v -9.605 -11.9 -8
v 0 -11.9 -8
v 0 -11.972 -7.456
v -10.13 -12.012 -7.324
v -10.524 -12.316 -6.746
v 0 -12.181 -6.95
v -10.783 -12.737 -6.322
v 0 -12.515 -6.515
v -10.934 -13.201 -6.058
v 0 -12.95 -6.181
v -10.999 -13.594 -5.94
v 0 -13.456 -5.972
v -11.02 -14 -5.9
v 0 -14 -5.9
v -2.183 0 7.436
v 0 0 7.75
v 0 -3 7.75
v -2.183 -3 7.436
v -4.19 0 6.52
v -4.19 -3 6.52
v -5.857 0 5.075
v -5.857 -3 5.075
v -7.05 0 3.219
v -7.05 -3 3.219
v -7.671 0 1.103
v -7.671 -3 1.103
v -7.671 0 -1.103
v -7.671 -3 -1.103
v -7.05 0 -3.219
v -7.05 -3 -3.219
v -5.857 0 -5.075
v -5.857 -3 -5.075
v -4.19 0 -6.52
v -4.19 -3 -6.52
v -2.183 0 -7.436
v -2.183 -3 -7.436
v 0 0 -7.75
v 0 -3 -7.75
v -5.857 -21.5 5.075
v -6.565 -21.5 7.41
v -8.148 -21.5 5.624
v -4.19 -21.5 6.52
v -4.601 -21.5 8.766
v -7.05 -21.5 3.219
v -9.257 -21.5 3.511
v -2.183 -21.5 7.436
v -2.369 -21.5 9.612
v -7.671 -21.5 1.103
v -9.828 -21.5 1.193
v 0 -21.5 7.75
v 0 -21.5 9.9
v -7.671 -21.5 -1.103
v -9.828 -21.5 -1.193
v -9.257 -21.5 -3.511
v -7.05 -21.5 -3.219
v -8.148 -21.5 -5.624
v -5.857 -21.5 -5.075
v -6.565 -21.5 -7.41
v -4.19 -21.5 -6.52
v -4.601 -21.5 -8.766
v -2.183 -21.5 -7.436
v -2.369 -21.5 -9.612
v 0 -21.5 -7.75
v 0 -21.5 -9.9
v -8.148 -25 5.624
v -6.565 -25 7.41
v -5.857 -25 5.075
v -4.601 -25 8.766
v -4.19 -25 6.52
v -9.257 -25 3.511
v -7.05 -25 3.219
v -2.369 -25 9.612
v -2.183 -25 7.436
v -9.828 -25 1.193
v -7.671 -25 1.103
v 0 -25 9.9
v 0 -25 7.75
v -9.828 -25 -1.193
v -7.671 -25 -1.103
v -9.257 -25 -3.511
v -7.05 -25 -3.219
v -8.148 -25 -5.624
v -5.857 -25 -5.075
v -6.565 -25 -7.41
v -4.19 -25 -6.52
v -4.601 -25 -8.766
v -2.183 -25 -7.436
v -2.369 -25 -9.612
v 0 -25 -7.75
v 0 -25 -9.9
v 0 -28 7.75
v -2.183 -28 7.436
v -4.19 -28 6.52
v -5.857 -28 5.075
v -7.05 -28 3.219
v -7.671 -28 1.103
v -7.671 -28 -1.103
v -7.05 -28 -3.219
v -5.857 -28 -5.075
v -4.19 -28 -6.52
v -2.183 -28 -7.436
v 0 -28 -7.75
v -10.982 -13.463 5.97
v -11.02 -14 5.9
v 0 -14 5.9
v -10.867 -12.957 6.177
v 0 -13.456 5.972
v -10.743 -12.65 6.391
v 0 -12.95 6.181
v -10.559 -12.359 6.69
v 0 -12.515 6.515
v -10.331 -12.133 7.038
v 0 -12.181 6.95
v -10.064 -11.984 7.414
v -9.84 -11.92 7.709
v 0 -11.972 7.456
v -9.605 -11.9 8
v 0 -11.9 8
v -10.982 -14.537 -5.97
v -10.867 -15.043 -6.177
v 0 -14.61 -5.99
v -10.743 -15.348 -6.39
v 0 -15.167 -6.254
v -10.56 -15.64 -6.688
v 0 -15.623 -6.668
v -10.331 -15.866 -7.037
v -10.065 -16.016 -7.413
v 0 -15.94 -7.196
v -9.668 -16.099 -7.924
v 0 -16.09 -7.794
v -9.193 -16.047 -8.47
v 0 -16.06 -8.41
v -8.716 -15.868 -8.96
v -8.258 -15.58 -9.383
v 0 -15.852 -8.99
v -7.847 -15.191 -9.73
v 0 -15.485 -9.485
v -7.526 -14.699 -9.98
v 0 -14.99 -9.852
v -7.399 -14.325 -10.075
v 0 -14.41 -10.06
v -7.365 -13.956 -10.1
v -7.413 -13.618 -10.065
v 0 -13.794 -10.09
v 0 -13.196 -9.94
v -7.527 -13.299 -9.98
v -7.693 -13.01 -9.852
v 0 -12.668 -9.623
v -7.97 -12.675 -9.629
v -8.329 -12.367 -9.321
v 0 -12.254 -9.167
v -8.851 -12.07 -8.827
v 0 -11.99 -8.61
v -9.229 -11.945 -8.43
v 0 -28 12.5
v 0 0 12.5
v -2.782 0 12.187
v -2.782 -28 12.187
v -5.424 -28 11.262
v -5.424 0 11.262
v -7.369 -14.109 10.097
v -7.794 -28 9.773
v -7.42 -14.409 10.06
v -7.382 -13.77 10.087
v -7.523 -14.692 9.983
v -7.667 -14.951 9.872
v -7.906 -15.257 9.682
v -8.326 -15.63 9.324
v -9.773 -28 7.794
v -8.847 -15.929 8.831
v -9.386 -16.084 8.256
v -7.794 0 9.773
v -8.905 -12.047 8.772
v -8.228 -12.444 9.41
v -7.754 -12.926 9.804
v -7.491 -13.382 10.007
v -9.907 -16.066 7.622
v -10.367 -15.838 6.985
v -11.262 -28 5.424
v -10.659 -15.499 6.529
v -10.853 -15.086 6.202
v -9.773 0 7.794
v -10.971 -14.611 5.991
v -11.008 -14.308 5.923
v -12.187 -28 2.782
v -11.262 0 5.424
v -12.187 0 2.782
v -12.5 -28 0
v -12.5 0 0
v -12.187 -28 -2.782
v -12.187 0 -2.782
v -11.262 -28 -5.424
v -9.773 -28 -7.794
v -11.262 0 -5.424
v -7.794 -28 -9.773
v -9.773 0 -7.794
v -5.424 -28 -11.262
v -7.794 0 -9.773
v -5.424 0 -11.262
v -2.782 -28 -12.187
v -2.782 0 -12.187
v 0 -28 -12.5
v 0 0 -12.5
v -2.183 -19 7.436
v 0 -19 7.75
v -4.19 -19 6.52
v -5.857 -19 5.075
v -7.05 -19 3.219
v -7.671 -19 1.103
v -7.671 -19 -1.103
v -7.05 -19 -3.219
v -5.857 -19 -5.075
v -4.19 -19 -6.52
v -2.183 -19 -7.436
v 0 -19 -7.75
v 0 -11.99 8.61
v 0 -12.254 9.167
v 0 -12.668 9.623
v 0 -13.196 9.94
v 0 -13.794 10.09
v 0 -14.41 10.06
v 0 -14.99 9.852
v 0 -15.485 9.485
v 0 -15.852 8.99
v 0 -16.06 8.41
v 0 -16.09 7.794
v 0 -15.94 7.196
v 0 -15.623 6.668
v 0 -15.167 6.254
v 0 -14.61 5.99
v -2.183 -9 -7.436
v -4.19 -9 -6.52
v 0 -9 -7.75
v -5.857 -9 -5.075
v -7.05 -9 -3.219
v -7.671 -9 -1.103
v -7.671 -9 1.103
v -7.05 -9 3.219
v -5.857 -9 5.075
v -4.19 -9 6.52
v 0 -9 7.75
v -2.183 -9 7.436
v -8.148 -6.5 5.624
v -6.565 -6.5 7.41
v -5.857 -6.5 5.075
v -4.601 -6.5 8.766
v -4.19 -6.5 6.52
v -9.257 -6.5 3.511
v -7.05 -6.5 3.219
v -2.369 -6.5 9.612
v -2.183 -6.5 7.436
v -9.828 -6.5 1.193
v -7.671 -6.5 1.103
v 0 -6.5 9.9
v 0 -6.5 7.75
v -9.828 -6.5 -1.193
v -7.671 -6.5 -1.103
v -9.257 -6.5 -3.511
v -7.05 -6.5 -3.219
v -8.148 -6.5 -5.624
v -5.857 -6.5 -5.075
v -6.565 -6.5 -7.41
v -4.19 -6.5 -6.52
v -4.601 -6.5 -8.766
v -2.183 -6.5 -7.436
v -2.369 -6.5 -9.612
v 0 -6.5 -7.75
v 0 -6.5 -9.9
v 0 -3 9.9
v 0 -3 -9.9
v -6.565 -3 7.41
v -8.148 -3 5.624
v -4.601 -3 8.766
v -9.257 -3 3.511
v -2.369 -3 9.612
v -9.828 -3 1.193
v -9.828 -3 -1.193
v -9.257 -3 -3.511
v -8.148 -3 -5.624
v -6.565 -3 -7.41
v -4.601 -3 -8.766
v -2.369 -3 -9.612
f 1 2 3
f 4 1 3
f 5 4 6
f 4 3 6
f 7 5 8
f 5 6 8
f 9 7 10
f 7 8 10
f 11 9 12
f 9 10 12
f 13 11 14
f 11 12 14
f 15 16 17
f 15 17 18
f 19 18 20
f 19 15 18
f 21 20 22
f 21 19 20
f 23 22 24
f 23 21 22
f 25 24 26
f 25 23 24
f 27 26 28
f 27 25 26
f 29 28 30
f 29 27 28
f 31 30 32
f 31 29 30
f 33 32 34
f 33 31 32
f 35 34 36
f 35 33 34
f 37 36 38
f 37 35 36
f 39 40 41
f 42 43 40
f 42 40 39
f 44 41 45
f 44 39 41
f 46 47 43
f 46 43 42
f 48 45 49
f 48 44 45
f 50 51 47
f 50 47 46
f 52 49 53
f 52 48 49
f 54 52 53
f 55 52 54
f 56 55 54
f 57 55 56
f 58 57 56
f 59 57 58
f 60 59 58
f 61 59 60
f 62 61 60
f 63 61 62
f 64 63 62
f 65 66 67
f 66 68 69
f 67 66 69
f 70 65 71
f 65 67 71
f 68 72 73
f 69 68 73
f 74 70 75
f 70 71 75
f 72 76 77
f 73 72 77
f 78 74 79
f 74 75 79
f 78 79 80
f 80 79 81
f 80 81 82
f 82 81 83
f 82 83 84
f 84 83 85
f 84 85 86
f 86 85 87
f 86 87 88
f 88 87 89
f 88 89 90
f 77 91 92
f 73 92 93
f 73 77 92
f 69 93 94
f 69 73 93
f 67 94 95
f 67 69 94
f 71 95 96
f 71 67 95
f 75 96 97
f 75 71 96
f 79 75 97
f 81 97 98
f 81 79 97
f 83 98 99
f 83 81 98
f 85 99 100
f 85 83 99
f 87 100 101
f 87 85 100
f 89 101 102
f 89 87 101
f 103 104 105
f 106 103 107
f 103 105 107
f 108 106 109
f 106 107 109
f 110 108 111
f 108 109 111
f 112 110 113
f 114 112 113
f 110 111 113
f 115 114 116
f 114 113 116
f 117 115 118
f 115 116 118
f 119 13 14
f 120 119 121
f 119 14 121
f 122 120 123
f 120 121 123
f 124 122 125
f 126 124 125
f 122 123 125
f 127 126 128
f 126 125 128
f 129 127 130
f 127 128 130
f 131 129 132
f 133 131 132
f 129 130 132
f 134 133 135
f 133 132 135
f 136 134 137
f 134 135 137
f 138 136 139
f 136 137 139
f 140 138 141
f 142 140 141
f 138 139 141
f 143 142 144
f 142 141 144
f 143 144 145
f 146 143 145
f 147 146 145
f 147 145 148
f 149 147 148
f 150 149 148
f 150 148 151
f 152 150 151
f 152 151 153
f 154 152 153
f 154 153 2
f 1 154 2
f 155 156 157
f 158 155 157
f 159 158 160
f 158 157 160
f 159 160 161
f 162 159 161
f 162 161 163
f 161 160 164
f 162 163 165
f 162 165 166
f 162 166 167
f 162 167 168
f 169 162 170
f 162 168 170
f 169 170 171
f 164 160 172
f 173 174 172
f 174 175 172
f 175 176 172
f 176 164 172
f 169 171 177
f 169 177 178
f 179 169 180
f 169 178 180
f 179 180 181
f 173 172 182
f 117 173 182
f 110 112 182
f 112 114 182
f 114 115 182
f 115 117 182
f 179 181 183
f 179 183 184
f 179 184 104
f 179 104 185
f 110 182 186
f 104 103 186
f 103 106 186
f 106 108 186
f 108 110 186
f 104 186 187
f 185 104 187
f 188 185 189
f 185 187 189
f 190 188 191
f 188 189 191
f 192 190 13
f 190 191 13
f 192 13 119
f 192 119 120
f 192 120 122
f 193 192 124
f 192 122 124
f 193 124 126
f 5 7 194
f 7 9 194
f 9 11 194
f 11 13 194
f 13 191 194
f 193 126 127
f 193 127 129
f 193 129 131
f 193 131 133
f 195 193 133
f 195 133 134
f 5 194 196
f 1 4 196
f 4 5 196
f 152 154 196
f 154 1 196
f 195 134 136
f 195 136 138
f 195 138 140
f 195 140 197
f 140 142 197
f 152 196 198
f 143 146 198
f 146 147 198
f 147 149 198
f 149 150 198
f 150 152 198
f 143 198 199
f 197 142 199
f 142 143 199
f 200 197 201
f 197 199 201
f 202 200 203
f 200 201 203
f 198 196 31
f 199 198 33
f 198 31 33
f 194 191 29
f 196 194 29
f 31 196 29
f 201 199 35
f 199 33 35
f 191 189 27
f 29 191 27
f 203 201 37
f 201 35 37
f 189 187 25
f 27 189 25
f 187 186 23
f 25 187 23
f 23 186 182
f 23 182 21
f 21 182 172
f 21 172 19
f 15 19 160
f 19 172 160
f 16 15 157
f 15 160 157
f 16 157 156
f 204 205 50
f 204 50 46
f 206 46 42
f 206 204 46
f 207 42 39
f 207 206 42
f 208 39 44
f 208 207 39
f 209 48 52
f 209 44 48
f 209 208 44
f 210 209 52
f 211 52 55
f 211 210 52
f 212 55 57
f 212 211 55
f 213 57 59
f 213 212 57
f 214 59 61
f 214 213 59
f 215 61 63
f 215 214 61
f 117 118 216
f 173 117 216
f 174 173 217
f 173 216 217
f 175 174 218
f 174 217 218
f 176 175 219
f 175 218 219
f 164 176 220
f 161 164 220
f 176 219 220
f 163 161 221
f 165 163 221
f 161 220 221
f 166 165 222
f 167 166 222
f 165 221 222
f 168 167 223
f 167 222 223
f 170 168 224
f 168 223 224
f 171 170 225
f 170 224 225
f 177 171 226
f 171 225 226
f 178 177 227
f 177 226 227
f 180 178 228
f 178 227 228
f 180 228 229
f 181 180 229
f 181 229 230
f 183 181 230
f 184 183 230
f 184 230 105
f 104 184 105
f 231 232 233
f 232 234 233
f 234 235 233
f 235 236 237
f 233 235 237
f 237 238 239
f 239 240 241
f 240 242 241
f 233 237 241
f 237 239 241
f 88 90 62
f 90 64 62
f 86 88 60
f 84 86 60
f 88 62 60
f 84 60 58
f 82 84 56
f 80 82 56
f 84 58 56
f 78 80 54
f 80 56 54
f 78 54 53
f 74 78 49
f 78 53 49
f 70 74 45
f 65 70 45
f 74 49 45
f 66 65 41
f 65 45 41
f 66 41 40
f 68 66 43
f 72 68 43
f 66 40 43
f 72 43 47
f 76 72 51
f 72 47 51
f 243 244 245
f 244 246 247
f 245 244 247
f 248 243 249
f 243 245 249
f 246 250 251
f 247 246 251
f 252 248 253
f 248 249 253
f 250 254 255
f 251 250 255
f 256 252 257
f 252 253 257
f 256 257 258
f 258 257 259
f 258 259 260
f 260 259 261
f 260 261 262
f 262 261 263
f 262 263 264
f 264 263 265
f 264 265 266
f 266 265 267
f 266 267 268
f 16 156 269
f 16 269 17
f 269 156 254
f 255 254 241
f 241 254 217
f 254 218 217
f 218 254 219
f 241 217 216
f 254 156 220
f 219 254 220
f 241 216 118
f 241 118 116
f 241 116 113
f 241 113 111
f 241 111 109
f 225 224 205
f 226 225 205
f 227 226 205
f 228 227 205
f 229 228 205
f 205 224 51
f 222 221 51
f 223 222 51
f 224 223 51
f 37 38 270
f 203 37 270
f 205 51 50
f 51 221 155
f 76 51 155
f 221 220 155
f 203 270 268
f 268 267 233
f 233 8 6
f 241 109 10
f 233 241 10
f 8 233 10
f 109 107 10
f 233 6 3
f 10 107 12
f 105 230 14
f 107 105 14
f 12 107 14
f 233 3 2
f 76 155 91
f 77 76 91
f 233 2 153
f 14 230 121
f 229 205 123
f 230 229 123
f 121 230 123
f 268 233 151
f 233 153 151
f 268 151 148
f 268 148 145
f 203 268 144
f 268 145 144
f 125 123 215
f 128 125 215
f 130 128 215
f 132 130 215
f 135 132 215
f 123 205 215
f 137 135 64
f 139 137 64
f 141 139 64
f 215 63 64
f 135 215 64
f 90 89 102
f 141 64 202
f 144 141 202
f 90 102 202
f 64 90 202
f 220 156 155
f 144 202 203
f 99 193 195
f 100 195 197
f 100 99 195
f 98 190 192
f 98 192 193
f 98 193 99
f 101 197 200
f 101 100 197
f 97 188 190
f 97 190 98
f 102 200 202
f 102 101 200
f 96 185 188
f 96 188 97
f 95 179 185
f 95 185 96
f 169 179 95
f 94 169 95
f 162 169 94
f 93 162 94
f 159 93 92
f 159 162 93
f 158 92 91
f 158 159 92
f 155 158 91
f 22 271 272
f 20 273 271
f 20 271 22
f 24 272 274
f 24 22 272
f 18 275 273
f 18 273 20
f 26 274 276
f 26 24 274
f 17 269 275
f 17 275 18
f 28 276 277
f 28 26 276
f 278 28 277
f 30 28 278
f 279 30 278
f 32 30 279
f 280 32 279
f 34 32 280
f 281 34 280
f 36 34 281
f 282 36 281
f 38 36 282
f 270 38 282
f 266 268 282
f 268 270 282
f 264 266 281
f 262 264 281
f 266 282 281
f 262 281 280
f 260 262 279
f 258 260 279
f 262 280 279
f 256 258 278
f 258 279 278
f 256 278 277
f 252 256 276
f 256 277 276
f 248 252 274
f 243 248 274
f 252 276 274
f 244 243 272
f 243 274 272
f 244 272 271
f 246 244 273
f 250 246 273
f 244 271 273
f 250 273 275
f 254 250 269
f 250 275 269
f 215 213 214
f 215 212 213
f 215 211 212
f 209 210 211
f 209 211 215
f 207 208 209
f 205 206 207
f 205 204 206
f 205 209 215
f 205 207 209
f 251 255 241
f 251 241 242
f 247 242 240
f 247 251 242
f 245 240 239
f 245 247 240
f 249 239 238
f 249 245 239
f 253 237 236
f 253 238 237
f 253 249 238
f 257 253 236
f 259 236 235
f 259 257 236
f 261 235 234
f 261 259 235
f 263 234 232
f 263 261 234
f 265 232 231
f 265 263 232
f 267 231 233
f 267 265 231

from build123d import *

# Parameters (mm, degrees)
F0_R      = 12.5
F0_R_2    = 7.75
F1_DEPTH  = 28
F2_W      = 3.5
F2_H      = 7.3783658981
F5_R      = 8.5
F6_DEPTH  = 5
F8_DEPTH  = 12.5
F10_DEPTH = 30


with BuildPart() as f1:
    # F0 (on Front) → F1 (new body)
    with BuildSketch(Plane.XZ):
        Circle(F0_R)
        Circle(F0_R_2, mode=Mode.SUBTRACT)
    extrude(amount=F1_DEPTH)

    # F2 (on Right) → F3 (revolve, cut)
    with BuildSketch(Plane.YZ):
        with Locations((-23.25, 6.2108170509)):
            Rectangle(F2_W, F2_H)
        with Locations((-4.75, 6.2108170509)):
            Rectangle(F2_W, F2_H)
    revolve(axis=Axis((0, -29.1106614321, 0), (0, 1, 0)), mode=Mode.SUBTRACT)

    # F5 (on mid) → F6 (join, symmetric)
    with BuildSketch(Plane.XZ.offset(14)):
        Circle(F5_R)
    extrude(amount=F6_DEPTH, both=True)

    # F7 (on Right) → F8 (cut, symmetric)
    with BuildSketch(Plane.YZ):
        with BuildLine():
            ThreePointArc((-11.9, 8), (-15.4849242405, 9.4849242405), (-14, 5.9))
            ThreePointArc((-14, 5.9), (-12.5150757595, 6.5150757595), (-11.9, 8))
        make_face()
        with BuildLine():
            ThreePointArc((-11.9, -8), (-12.5150757595, -6.5150757595), (-14, -5.9))
            ThreePointArc((-14, -5.9), (-15.4849242405, -9.4849242405), (-11.9, -8))
        make_face()
    extrude(amount=F8_DEPTH, both=True, mode=Mode.SUBTRACT)

    # F9 (on face) → F10 (cut)
    with BuildSketch(Plane.XZ.offset(28)):
        with BuildLine():
            Line((0, 12.5), (0, 7.75))
            ThreePointArc((0, 7.75), (5.4800775542, 5.4800775542), (7.75, 0))
            ThreePointArc((7.75, 0), (5.4800775542, -5.4800775542), (0, -7.75))
            Line((0, -7.75), (0, -12.5))
            ThreePointArc((0, -12.5), (8.8388347648, -8.8388347648), (12.5, 0))
            ThreePointArc((12.5, 0), (8.8388347648, 8.8388347648), (0, 12.5))
        make_face()
        with BuildLine():
            Line((0, 7.75), (0, -2.1648029558))
            Line((0, -2.1648029558), (0, -7.75))
            ThreePointArc((0, -7.75), (5.4800775542, -5.4800775542), (7.75, 0))
            ThreePointArc((7.75, 0), (5.4800775542, 5.4800775542), (0, 7.75))
        make_face()
    extrude(amount=-F10_DEPTH, mode=Mode.SUBTRACT)


solid = f1.part
